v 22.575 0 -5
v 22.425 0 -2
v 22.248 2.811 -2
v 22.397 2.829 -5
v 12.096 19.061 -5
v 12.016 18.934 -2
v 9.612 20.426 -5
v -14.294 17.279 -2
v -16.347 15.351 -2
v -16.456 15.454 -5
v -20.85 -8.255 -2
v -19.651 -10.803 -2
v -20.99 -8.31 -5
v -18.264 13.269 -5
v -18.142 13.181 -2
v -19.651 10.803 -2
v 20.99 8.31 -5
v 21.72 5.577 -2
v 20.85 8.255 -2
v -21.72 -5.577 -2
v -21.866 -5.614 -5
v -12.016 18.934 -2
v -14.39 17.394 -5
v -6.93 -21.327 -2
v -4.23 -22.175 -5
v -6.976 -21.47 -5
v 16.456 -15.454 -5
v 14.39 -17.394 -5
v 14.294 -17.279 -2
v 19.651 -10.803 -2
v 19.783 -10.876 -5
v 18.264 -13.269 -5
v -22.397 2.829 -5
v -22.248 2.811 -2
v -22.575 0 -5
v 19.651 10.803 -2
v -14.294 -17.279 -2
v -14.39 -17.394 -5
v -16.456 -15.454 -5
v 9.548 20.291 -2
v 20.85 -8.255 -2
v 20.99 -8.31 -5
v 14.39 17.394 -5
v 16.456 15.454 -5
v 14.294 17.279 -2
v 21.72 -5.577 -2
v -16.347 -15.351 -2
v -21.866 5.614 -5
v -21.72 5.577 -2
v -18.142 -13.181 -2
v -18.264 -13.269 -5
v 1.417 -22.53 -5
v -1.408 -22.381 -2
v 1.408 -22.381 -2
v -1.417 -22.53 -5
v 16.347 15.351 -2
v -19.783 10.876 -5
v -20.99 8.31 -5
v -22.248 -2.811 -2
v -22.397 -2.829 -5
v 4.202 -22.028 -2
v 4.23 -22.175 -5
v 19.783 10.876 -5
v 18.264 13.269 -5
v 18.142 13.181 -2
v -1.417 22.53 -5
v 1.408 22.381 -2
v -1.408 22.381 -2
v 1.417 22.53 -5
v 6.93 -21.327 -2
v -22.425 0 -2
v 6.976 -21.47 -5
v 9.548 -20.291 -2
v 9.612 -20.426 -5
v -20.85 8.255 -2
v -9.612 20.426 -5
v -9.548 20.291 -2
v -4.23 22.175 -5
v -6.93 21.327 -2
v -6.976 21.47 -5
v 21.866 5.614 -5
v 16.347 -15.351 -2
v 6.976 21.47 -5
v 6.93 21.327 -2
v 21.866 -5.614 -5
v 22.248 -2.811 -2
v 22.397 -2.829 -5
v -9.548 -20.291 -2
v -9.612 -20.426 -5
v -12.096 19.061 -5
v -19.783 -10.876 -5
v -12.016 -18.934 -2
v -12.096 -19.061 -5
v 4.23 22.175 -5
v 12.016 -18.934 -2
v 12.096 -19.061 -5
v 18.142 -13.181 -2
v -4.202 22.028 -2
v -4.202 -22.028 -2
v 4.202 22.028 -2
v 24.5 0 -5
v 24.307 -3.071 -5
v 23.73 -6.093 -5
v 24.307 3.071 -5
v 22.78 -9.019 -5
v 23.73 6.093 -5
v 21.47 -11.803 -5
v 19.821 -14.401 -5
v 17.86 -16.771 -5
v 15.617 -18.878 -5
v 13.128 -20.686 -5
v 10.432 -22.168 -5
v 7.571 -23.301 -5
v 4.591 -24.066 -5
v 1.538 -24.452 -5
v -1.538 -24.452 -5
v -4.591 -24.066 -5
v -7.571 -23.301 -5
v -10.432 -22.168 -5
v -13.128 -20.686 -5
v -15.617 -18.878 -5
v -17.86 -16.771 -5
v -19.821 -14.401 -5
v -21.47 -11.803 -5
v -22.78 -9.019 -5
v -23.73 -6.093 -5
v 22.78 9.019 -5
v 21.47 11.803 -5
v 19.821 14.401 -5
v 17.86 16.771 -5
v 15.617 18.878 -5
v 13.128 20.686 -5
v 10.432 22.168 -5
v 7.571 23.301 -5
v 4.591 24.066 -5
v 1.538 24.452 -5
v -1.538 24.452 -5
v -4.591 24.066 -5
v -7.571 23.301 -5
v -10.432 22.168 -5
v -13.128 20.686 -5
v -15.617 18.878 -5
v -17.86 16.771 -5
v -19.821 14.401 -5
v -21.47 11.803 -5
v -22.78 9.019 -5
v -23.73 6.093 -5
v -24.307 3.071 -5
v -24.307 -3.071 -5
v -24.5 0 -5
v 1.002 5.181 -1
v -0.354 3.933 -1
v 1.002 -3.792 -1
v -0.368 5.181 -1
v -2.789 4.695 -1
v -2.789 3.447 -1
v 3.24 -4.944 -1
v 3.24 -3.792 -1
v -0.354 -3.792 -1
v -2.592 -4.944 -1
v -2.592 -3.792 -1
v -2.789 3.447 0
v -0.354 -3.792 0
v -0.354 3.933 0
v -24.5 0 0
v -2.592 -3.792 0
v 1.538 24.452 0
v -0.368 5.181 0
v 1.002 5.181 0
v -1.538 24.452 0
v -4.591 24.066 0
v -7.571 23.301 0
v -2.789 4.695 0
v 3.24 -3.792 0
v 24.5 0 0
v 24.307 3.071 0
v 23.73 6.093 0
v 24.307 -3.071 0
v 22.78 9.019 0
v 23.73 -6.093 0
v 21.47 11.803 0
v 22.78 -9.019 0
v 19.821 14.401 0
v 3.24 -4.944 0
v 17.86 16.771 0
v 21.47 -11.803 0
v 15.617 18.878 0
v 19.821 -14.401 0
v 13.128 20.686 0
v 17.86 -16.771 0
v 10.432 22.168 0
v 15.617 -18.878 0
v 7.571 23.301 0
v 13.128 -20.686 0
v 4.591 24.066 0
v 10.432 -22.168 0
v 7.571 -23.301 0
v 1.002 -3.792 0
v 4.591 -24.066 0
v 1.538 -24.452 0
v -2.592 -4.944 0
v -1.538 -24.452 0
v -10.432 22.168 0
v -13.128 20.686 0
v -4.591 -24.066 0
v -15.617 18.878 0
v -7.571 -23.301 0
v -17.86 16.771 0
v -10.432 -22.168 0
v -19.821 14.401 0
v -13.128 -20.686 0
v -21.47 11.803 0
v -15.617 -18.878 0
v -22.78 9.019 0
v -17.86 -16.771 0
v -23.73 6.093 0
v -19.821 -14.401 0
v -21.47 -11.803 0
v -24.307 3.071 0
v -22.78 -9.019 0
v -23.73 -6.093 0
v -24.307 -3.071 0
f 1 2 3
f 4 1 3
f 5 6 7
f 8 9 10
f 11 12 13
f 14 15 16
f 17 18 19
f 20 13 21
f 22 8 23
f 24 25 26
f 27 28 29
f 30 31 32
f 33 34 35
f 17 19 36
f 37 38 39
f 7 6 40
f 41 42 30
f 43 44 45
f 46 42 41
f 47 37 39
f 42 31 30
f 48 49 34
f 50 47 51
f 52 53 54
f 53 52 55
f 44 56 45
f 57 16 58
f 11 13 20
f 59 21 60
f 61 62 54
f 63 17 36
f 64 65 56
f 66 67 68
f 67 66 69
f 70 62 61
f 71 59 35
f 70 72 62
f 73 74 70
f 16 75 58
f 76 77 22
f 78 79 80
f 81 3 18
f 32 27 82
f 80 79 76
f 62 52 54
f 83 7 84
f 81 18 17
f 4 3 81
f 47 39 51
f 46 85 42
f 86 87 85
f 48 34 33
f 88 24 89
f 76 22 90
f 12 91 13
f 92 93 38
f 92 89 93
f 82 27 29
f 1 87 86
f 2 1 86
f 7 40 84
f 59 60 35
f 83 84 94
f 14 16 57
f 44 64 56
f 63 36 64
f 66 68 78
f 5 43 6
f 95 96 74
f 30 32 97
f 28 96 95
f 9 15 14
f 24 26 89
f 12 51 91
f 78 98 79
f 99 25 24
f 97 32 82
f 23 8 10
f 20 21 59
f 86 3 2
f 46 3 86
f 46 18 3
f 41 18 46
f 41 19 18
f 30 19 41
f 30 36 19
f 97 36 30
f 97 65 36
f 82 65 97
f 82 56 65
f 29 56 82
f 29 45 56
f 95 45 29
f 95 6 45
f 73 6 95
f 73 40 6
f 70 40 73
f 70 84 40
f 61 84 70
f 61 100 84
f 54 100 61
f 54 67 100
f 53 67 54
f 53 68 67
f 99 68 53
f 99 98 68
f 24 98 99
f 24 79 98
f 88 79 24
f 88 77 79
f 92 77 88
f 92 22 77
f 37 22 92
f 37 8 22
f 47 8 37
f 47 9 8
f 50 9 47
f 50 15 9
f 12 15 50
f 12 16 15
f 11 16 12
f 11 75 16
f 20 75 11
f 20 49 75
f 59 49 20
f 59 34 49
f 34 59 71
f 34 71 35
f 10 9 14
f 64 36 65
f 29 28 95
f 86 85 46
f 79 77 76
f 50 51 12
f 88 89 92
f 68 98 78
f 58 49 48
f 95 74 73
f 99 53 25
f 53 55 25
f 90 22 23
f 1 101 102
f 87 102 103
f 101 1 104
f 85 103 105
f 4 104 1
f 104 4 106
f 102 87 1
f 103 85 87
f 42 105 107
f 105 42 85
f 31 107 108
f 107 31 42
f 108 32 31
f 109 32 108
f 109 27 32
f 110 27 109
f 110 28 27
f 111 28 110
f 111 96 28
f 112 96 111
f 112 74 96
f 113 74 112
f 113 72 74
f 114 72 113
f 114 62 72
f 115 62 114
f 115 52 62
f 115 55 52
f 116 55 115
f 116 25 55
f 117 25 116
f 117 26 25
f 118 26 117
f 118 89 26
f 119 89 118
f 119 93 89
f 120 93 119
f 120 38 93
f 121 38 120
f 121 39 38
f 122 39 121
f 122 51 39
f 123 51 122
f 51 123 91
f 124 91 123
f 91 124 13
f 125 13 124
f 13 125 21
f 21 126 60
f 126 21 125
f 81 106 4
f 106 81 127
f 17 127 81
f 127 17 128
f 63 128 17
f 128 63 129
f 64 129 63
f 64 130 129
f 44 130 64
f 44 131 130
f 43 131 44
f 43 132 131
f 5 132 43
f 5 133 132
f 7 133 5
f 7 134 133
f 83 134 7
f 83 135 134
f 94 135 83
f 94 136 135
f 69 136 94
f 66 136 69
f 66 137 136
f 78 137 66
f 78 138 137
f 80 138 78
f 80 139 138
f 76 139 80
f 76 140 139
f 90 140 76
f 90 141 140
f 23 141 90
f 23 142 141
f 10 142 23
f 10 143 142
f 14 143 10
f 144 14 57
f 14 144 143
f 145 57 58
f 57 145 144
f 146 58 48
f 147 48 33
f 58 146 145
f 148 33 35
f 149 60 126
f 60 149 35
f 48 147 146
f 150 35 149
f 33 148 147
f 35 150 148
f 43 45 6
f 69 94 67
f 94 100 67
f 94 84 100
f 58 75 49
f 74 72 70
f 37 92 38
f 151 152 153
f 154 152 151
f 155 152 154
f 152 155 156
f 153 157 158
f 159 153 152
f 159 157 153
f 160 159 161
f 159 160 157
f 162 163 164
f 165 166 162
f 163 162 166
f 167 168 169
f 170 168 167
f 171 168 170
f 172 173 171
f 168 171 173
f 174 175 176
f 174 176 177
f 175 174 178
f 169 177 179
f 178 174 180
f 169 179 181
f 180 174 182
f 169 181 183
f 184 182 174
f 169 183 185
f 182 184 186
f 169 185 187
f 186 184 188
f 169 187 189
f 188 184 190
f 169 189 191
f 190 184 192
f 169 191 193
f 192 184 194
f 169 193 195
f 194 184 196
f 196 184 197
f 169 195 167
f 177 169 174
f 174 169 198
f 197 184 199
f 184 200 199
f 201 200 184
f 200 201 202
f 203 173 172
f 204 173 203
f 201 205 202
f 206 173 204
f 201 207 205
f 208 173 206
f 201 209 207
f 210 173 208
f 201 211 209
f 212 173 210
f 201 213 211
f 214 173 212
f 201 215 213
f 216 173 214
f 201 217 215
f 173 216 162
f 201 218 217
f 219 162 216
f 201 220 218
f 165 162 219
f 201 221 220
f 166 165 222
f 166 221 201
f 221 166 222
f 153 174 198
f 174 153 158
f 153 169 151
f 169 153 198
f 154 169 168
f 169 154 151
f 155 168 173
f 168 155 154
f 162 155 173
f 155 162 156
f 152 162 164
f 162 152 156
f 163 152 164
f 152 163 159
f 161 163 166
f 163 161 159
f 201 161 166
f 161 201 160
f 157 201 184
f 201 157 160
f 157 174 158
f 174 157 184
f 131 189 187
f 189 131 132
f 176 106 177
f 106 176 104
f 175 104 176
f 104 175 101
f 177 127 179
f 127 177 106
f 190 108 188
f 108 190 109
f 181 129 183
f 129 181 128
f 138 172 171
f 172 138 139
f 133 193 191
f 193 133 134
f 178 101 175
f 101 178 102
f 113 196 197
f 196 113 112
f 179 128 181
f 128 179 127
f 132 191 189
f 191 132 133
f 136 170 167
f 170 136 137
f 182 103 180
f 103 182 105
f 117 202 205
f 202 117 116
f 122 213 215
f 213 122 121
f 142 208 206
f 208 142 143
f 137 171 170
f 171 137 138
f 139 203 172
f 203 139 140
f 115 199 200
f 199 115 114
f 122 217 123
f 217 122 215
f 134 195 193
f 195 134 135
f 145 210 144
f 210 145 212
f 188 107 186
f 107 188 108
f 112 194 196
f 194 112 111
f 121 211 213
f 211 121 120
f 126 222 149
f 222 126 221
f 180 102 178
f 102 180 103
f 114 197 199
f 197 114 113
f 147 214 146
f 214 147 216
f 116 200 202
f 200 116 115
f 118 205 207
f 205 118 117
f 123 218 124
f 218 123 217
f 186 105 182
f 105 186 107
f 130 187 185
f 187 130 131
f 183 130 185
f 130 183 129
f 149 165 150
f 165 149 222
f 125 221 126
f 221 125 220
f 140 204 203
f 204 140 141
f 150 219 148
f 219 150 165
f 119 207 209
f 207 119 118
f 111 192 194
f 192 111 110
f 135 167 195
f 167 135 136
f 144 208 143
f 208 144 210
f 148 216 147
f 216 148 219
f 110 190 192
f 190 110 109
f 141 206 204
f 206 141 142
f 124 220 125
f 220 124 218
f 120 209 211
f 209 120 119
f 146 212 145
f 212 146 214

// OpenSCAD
$fn = 50;

difference() {
	union() {
		translate(v = [0, 0, -5.0]) {
			cylinder(h = 5, r = 24.5);
		}
	}
	union() {
		#translate(v = [0, 0, -5.0]) {
			cylinder(h = 3, r1 = 22.575, r2 = 22.425);
		}
		translate(v = [0, 0, -1]) {
			linear_extrude(height = 1) {
				text(font = "Impact", halign = "center", size = 10, text = "1", valign = "center");
			}
		}
	}
}
